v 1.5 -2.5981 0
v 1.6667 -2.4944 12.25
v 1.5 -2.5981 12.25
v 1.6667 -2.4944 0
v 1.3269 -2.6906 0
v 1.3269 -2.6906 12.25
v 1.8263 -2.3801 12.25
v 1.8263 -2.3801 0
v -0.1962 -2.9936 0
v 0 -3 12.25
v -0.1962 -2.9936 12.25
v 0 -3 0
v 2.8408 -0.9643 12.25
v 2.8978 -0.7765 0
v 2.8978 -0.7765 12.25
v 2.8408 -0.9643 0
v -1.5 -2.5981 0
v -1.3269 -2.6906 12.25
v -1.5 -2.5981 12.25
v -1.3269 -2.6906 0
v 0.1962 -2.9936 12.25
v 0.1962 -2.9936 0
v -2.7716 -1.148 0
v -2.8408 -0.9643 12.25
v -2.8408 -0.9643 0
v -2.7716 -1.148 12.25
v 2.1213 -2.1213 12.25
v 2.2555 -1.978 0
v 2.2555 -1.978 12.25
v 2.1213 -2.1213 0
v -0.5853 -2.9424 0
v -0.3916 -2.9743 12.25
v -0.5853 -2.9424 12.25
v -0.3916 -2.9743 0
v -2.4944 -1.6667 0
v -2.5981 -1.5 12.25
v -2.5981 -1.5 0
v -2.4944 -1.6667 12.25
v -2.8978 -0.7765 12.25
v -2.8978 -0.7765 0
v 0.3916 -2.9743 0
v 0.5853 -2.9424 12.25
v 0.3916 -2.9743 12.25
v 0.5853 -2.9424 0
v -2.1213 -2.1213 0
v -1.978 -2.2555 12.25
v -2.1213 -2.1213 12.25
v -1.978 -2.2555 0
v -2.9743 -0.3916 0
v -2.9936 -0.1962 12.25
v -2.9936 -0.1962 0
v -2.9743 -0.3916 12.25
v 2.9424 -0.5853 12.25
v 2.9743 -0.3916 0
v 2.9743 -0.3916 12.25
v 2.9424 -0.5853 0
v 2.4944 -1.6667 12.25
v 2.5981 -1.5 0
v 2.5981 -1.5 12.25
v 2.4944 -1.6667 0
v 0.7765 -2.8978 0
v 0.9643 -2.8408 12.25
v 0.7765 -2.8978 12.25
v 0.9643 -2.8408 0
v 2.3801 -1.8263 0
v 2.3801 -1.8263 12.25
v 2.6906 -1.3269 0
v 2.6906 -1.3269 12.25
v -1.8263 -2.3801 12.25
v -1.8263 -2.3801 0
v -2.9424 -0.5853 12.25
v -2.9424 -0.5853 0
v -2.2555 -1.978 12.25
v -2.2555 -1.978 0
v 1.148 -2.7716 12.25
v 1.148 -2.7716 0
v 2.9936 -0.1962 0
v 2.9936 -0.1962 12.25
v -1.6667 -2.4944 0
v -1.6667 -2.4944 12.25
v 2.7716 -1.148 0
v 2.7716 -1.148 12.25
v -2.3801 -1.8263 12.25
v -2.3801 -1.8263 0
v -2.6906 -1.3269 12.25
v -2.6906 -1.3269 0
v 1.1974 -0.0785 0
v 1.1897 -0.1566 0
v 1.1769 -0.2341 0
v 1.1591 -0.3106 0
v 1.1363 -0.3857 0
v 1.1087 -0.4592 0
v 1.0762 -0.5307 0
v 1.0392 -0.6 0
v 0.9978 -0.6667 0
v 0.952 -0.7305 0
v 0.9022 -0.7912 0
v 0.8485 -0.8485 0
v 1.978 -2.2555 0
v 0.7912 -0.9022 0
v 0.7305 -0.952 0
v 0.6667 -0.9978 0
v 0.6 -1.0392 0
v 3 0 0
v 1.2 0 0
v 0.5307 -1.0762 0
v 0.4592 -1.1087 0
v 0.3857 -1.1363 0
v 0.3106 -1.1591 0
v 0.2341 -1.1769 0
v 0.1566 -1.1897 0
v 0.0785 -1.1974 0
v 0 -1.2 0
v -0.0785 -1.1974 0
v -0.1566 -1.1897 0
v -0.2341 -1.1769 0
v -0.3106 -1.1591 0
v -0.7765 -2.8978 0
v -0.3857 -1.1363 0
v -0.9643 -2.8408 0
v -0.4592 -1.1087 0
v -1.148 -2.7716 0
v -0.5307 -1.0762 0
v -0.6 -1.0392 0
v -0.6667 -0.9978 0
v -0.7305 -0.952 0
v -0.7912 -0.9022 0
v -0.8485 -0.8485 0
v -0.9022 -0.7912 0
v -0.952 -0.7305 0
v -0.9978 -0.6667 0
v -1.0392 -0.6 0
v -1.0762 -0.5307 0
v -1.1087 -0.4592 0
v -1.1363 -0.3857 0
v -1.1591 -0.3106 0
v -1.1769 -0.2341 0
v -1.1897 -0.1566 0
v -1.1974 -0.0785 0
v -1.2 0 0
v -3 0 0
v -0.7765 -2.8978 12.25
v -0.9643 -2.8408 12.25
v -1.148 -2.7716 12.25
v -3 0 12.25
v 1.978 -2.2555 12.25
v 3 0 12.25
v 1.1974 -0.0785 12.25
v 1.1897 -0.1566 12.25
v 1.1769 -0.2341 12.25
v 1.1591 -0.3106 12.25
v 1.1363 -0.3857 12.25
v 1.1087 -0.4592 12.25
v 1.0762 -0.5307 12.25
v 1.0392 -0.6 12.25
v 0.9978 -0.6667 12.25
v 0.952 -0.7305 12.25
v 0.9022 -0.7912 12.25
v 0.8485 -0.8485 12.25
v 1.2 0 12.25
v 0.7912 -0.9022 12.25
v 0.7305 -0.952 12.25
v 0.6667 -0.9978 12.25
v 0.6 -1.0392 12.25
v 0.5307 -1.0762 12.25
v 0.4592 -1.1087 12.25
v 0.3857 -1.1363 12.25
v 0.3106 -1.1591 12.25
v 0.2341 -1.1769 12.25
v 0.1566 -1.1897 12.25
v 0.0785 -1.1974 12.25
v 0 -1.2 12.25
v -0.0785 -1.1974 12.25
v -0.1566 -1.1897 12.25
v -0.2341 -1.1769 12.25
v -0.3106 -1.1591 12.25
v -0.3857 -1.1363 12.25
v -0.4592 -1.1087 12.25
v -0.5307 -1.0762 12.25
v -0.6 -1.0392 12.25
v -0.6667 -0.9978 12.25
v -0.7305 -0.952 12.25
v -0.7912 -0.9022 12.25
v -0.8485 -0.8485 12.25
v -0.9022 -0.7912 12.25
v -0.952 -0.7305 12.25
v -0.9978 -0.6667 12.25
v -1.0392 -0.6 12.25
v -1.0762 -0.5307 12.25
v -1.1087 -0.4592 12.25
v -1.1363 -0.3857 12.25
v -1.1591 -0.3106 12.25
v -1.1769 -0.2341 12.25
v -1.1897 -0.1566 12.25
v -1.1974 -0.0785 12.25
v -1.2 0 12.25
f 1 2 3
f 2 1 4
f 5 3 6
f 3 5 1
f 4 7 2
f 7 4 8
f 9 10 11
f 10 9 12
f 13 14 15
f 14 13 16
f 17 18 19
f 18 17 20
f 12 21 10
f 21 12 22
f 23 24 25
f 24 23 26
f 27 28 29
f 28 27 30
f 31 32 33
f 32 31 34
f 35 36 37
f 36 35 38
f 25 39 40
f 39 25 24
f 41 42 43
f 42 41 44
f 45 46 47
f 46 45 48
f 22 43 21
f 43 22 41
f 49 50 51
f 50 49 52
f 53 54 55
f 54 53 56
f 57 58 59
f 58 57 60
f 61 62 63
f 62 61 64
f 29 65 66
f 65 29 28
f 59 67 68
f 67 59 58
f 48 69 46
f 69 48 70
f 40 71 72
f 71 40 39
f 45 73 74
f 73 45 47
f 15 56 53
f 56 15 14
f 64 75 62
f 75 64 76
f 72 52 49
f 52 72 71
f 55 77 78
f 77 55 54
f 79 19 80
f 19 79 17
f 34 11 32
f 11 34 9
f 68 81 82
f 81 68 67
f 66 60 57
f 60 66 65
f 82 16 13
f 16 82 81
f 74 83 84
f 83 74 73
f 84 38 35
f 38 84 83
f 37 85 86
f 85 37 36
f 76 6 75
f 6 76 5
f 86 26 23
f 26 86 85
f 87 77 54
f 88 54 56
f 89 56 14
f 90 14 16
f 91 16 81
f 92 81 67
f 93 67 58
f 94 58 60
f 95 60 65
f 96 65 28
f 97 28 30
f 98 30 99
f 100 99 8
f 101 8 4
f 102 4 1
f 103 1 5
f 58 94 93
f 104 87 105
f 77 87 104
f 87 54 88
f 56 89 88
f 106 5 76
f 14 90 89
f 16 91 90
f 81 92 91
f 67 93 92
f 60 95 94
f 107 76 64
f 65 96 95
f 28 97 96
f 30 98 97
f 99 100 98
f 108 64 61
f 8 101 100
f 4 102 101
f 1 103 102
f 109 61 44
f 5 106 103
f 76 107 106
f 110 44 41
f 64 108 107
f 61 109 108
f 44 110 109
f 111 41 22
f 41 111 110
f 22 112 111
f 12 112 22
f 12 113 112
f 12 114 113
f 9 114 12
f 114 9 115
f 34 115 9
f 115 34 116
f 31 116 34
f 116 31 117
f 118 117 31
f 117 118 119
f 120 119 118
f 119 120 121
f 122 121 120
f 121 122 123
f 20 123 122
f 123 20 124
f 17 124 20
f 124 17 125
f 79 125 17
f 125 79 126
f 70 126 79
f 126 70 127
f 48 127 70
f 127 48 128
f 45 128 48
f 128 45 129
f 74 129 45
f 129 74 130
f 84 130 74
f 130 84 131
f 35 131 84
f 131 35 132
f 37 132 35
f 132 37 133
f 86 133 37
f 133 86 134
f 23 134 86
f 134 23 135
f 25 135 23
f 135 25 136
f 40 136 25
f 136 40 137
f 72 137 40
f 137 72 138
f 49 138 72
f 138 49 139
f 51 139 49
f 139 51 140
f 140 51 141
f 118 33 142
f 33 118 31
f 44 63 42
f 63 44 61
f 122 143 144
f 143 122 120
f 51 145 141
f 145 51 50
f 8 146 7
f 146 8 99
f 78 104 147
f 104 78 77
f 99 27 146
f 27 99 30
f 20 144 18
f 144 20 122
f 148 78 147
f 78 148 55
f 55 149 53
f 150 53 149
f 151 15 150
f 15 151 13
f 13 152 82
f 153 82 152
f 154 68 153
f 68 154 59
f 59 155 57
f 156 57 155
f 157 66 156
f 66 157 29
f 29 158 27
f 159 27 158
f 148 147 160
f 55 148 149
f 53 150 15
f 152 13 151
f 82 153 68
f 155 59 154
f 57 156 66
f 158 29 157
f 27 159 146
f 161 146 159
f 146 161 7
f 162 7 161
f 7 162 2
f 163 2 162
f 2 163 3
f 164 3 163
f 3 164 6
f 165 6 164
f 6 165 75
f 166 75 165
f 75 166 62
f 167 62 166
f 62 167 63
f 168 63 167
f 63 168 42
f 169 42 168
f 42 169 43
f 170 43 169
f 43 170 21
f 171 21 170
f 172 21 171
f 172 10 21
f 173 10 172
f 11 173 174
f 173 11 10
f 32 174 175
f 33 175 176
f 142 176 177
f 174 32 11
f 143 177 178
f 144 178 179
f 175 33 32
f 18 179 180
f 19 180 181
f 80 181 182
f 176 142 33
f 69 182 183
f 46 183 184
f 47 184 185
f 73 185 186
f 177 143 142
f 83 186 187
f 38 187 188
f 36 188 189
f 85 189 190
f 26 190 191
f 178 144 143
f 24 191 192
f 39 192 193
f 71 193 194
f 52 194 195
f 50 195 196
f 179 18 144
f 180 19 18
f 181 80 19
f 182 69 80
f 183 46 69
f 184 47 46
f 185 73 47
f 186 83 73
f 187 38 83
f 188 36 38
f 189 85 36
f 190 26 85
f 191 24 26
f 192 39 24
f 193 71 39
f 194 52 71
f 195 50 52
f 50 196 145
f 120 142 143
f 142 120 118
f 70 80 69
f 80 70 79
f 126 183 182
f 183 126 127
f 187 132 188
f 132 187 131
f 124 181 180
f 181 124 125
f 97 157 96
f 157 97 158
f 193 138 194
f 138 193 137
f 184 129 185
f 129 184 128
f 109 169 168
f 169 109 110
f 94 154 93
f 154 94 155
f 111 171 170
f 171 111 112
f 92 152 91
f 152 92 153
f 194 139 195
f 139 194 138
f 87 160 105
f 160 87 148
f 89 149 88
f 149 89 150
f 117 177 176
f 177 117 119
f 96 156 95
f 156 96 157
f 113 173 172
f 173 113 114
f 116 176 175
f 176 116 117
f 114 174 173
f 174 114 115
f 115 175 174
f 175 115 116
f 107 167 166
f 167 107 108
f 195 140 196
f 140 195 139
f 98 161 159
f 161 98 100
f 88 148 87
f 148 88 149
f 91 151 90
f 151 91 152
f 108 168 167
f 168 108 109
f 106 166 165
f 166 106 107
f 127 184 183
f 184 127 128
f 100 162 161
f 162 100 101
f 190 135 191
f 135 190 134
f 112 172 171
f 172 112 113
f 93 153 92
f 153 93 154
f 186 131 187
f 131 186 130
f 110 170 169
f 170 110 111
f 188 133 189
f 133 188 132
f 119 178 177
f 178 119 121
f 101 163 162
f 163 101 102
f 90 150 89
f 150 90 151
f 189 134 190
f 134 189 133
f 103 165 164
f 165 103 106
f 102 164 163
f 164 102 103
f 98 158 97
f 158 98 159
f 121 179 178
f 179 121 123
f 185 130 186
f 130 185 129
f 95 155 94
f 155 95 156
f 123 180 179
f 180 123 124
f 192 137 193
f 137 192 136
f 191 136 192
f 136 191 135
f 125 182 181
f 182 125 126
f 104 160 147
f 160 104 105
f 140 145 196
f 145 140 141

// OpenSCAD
// REVIEW ONLY; mm. Opening toward nearest Zio; rotated180deg at top anchor.
H=12.25; R=3; bore=2.4;
$fn=96; difference(){cylinder(h=H,r=R);translate([0,0,-.1])cylinder(h=H+.2,d=bore);translate([-5,0,-1])cube([10,10,H+2]);}
